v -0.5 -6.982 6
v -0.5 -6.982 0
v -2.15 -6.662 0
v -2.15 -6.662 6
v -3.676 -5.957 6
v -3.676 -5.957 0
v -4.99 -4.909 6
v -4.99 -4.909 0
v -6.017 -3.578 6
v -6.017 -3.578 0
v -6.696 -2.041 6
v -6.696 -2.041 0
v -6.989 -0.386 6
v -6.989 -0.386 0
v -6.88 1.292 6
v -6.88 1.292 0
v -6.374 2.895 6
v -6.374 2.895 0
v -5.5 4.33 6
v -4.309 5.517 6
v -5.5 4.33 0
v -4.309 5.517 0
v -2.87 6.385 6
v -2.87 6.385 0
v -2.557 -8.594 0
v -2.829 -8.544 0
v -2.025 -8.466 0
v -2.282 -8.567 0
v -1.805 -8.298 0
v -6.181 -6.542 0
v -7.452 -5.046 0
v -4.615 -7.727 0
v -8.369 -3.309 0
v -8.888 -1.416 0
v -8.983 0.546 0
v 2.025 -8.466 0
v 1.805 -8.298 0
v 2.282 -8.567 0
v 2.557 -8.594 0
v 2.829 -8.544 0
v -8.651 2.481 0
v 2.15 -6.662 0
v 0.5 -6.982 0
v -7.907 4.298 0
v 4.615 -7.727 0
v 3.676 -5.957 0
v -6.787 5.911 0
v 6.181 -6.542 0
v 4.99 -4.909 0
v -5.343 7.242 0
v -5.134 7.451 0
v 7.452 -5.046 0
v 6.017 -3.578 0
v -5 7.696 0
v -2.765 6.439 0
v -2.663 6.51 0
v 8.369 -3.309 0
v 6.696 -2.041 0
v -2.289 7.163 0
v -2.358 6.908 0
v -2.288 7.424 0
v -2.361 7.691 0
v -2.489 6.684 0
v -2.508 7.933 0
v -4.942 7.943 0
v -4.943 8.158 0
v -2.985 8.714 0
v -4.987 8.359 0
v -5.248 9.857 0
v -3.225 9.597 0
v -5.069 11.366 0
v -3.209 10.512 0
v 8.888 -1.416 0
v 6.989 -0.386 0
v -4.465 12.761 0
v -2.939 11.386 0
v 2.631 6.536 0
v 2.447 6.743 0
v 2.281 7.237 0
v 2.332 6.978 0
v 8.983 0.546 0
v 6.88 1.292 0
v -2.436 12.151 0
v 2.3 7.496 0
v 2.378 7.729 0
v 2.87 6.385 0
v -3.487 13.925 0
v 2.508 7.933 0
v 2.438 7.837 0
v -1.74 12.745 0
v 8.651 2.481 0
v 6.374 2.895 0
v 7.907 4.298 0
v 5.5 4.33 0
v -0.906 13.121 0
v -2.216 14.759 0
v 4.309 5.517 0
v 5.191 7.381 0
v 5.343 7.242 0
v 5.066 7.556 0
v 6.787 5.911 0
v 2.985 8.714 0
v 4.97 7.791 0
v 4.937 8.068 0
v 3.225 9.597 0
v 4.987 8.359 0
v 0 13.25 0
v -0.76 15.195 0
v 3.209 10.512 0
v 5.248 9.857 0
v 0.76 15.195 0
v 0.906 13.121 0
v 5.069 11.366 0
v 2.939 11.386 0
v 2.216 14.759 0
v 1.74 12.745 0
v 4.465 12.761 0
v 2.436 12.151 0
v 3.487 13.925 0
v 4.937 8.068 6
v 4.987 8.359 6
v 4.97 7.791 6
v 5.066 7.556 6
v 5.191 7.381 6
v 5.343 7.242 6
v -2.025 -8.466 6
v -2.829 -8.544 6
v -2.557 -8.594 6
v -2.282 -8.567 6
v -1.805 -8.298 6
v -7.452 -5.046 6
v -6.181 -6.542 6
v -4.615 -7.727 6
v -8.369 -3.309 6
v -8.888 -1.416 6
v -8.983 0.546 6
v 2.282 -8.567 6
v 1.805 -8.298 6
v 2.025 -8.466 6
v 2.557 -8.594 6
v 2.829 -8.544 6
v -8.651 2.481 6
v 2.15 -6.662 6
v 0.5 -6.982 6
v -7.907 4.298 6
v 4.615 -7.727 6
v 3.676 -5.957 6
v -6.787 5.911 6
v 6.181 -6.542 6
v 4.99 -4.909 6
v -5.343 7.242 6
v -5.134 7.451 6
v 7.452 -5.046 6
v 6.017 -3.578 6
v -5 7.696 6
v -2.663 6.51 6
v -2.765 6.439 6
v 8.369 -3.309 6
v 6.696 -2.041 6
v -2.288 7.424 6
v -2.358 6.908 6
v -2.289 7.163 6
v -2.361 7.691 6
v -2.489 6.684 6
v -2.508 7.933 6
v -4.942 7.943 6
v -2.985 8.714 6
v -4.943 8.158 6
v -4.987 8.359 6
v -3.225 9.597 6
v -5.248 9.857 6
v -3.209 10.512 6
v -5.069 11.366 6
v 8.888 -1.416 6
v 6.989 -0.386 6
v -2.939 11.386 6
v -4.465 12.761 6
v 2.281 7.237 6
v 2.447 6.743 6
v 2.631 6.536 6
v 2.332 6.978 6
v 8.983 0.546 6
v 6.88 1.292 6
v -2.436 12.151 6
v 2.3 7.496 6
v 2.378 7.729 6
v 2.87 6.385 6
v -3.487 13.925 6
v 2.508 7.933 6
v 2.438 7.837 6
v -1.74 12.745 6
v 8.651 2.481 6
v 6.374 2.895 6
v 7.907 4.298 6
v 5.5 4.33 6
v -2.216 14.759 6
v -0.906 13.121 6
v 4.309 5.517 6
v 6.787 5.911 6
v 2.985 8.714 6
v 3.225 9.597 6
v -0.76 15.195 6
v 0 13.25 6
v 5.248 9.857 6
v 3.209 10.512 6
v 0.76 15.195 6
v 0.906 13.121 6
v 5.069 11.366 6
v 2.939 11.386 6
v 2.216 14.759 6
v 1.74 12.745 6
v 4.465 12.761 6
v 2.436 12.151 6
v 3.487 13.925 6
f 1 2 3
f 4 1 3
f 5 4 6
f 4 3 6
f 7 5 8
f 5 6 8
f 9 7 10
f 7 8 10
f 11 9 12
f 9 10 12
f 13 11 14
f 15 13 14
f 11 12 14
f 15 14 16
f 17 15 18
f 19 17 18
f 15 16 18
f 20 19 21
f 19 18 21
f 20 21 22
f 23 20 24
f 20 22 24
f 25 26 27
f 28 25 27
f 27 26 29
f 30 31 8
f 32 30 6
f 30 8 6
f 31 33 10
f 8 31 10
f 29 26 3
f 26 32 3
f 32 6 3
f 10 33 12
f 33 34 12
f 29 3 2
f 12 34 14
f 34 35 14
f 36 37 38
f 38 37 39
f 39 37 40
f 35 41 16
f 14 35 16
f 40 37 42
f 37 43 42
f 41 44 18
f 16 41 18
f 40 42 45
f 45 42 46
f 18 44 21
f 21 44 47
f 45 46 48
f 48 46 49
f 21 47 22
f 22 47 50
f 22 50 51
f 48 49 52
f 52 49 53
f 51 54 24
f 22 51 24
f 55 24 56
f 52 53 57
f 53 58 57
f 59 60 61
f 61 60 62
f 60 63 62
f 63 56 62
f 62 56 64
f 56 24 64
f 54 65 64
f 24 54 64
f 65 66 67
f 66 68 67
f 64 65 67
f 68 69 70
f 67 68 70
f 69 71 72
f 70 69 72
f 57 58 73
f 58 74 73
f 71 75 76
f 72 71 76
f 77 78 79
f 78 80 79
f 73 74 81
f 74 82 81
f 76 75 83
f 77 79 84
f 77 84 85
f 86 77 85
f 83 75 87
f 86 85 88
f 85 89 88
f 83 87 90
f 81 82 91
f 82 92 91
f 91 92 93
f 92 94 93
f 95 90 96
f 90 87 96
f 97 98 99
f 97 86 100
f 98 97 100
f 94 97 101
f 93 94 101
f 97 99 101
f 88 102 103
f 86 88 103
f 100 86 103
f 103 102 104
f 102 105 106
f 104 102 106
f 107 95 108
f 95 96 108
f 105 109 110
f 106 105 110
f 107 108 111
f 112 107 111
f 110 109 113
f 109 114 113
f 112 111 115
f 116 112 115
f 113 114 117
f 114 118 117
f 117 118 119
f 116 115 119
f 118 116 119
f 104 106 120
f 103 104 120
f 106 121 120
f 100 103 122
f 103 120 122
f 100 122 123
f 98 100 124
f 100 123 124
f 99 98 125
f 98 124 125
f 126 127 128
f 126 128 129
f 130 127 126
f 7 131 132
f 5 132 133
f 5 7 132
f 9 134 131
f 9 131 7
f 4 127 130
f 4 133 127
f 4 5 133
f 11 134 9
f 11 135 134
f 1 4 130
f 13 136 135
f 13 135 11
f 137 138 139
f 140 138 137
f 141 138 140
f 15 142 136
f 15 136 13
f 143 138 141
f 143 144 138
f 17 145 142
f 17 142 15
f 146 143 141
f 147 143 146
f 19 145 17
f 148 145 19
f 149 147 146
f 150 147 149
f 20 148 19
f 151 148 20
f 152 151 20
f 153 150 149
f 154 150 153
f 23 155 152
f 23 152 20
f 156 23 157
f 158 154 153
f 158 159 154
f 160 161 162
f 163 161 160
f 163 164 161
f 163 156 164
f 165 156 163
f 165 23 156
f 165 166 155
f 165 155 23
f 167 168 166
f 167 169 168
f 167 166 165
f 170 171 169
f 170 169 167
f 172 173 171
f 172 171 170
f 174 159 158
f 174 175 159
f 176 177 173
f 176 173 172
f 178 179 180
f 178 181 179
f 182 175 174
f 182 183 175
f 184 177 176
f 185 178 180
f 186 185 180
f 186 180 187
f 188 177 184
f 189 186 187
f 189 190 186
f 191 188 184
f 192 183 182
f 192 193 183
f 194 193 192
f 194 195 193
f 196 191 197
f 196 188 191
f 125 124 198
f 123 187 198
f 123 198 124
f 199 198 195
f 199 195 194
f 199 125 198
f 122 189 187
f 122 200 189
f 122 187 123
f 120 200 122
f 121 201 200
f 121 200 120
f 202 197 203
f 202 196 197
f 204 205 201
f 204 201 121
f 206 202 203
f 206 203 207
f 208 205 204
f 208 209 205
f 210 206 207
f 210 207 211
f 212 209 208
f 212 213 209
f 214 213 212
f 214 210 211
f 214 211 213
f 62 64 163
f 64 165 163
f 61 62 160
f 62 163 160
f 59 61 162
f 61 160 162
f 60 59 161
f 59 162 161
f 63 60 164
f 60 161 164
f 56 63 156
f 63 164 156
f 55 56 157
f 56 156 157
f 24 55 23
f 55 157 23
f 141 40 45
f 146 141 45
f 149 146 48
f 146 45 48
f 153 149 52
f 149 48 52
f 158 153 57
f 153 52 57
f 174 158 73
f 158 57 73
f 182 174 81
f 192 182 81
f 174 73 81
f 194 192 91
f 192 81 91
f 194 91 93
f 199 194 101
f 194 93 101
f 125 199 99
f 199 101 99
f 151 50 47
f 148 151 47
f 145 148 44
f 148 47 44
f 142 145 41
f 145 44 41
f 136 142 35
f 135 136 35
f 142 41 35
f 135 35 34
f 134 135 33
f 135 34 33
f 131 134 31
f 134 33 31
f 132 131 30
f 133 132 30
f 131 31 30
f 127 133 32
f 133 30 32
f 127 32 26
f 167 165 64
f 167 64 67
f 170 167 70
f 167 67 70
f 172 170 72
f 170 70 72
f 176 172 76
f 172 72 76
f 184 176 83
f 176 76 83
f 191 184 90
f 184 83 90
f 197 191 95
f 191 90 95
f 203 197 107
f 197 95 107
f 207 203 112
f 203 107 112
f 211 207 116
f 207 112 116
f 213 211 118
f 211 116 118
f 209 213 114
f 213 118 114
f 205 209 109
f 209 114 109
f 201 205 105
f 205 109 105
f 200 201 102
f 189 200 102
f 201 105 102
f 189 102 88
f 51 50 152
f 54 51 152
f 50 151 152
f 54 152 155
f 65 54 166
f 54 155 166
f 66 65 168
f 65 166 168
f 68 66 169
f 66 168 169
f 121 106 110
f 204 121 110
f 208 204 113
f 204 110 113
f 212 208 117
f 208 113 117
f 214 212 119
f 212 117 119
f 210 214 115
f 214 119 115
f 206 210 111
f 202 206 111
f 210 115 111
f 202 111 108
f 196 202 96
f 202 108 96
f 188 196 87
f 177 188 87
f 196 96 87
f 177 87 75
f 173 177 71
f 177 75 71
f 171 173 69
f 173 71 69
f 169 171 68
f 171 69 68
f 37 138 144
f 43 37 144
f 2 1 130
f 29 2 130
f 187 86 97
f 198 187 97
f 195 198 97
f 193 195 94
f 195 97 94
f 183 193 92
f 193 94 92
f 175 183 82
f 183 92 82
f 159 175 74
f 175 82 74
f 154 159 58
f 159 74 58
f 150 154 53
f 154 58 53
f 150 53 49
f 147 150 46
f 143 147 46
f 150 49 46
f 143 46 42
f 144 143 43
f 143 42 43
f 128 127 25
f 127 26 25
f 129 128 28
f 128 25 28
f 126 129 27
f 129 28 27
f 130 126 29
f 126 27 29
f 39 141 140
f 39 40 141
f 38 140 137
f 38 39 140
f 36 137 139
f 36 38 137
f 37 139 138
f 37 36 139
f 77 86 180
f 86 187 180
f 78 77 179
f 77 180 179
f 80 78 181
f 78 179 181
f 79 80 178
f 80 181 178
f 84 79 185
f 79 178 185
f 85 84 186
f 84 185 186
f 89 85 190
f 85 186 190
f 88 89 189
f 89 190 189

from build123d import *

# Parameters (mm, degrees)
F1_DEPTH = 6
F3_DEPTH = 6.001
F4_R     = 1


with BuildPart() as f1:
    # F0 (on Top) → F1 (new body)
    with BuildSketch(Plane.XY):
        with BuildLine():
            ThreePointArc((-4.7055641516, 7.671875), (0, -9), (4.7055641516, 7.671875))
            ThreePointArc((4.7055641516, 7.671875), (0, 15.25), (-4.7055641516, 7.671875))
        make_face()
        with BuildLine():
            ThreePointArc((1.0429029122, 6.921875), (0, -7), (-1.0429029122, 6.921875))
            ThreePointArc((-1.0429029122, 6.921875), (0, 13.25), (1.0429029122, 6.921875))
        make_face(mode=Mode.SUBTRACT)
    extrude(amount=F1_DEPTH)

    # F2 (on face) → F3 (cut, through all)
    with BuildSketch(Plane.XY.offset(6)):
        with BuildLine():
            ThreePointArc((0.5, -6.9821200219), (0, -7), (-0.5, -6.9821200219))
            Line((-0.5, -6.9821200219), (-2.2234871513, -8.7210151294))
            ThreePointArc((-2.2234871513, -8.7210151294), (-1.1204605827, -8.9299814156), (0, -9))
            ThreePointArc((0, -9), (1.1204605827, -8.9299814156), (2.2234871513, -8.7210151294))
            Line((2.2234871513, -8.7210151294), (0.5, -6.9821200219))
        make_face()
    extrude(amount=-F3_DEPTH, mode=Mode.SUBTRACT)

    # F4
    f4_edges = [f1.edges().sort_by_distance(p)[0] for p in [
        (-1.042903, 6.921875, 3),
        (4.705564, 7.671875, 3),
        (2.223487, -8.721015, 3),
        (-2.223487, -8.721015, 3),
        (-4.705564, 7.671875, 3),
        (1.042903, 6.921875, 3),
    ]]
    fillet(f4_edges, radius=F4_R)


solid = f1.part
